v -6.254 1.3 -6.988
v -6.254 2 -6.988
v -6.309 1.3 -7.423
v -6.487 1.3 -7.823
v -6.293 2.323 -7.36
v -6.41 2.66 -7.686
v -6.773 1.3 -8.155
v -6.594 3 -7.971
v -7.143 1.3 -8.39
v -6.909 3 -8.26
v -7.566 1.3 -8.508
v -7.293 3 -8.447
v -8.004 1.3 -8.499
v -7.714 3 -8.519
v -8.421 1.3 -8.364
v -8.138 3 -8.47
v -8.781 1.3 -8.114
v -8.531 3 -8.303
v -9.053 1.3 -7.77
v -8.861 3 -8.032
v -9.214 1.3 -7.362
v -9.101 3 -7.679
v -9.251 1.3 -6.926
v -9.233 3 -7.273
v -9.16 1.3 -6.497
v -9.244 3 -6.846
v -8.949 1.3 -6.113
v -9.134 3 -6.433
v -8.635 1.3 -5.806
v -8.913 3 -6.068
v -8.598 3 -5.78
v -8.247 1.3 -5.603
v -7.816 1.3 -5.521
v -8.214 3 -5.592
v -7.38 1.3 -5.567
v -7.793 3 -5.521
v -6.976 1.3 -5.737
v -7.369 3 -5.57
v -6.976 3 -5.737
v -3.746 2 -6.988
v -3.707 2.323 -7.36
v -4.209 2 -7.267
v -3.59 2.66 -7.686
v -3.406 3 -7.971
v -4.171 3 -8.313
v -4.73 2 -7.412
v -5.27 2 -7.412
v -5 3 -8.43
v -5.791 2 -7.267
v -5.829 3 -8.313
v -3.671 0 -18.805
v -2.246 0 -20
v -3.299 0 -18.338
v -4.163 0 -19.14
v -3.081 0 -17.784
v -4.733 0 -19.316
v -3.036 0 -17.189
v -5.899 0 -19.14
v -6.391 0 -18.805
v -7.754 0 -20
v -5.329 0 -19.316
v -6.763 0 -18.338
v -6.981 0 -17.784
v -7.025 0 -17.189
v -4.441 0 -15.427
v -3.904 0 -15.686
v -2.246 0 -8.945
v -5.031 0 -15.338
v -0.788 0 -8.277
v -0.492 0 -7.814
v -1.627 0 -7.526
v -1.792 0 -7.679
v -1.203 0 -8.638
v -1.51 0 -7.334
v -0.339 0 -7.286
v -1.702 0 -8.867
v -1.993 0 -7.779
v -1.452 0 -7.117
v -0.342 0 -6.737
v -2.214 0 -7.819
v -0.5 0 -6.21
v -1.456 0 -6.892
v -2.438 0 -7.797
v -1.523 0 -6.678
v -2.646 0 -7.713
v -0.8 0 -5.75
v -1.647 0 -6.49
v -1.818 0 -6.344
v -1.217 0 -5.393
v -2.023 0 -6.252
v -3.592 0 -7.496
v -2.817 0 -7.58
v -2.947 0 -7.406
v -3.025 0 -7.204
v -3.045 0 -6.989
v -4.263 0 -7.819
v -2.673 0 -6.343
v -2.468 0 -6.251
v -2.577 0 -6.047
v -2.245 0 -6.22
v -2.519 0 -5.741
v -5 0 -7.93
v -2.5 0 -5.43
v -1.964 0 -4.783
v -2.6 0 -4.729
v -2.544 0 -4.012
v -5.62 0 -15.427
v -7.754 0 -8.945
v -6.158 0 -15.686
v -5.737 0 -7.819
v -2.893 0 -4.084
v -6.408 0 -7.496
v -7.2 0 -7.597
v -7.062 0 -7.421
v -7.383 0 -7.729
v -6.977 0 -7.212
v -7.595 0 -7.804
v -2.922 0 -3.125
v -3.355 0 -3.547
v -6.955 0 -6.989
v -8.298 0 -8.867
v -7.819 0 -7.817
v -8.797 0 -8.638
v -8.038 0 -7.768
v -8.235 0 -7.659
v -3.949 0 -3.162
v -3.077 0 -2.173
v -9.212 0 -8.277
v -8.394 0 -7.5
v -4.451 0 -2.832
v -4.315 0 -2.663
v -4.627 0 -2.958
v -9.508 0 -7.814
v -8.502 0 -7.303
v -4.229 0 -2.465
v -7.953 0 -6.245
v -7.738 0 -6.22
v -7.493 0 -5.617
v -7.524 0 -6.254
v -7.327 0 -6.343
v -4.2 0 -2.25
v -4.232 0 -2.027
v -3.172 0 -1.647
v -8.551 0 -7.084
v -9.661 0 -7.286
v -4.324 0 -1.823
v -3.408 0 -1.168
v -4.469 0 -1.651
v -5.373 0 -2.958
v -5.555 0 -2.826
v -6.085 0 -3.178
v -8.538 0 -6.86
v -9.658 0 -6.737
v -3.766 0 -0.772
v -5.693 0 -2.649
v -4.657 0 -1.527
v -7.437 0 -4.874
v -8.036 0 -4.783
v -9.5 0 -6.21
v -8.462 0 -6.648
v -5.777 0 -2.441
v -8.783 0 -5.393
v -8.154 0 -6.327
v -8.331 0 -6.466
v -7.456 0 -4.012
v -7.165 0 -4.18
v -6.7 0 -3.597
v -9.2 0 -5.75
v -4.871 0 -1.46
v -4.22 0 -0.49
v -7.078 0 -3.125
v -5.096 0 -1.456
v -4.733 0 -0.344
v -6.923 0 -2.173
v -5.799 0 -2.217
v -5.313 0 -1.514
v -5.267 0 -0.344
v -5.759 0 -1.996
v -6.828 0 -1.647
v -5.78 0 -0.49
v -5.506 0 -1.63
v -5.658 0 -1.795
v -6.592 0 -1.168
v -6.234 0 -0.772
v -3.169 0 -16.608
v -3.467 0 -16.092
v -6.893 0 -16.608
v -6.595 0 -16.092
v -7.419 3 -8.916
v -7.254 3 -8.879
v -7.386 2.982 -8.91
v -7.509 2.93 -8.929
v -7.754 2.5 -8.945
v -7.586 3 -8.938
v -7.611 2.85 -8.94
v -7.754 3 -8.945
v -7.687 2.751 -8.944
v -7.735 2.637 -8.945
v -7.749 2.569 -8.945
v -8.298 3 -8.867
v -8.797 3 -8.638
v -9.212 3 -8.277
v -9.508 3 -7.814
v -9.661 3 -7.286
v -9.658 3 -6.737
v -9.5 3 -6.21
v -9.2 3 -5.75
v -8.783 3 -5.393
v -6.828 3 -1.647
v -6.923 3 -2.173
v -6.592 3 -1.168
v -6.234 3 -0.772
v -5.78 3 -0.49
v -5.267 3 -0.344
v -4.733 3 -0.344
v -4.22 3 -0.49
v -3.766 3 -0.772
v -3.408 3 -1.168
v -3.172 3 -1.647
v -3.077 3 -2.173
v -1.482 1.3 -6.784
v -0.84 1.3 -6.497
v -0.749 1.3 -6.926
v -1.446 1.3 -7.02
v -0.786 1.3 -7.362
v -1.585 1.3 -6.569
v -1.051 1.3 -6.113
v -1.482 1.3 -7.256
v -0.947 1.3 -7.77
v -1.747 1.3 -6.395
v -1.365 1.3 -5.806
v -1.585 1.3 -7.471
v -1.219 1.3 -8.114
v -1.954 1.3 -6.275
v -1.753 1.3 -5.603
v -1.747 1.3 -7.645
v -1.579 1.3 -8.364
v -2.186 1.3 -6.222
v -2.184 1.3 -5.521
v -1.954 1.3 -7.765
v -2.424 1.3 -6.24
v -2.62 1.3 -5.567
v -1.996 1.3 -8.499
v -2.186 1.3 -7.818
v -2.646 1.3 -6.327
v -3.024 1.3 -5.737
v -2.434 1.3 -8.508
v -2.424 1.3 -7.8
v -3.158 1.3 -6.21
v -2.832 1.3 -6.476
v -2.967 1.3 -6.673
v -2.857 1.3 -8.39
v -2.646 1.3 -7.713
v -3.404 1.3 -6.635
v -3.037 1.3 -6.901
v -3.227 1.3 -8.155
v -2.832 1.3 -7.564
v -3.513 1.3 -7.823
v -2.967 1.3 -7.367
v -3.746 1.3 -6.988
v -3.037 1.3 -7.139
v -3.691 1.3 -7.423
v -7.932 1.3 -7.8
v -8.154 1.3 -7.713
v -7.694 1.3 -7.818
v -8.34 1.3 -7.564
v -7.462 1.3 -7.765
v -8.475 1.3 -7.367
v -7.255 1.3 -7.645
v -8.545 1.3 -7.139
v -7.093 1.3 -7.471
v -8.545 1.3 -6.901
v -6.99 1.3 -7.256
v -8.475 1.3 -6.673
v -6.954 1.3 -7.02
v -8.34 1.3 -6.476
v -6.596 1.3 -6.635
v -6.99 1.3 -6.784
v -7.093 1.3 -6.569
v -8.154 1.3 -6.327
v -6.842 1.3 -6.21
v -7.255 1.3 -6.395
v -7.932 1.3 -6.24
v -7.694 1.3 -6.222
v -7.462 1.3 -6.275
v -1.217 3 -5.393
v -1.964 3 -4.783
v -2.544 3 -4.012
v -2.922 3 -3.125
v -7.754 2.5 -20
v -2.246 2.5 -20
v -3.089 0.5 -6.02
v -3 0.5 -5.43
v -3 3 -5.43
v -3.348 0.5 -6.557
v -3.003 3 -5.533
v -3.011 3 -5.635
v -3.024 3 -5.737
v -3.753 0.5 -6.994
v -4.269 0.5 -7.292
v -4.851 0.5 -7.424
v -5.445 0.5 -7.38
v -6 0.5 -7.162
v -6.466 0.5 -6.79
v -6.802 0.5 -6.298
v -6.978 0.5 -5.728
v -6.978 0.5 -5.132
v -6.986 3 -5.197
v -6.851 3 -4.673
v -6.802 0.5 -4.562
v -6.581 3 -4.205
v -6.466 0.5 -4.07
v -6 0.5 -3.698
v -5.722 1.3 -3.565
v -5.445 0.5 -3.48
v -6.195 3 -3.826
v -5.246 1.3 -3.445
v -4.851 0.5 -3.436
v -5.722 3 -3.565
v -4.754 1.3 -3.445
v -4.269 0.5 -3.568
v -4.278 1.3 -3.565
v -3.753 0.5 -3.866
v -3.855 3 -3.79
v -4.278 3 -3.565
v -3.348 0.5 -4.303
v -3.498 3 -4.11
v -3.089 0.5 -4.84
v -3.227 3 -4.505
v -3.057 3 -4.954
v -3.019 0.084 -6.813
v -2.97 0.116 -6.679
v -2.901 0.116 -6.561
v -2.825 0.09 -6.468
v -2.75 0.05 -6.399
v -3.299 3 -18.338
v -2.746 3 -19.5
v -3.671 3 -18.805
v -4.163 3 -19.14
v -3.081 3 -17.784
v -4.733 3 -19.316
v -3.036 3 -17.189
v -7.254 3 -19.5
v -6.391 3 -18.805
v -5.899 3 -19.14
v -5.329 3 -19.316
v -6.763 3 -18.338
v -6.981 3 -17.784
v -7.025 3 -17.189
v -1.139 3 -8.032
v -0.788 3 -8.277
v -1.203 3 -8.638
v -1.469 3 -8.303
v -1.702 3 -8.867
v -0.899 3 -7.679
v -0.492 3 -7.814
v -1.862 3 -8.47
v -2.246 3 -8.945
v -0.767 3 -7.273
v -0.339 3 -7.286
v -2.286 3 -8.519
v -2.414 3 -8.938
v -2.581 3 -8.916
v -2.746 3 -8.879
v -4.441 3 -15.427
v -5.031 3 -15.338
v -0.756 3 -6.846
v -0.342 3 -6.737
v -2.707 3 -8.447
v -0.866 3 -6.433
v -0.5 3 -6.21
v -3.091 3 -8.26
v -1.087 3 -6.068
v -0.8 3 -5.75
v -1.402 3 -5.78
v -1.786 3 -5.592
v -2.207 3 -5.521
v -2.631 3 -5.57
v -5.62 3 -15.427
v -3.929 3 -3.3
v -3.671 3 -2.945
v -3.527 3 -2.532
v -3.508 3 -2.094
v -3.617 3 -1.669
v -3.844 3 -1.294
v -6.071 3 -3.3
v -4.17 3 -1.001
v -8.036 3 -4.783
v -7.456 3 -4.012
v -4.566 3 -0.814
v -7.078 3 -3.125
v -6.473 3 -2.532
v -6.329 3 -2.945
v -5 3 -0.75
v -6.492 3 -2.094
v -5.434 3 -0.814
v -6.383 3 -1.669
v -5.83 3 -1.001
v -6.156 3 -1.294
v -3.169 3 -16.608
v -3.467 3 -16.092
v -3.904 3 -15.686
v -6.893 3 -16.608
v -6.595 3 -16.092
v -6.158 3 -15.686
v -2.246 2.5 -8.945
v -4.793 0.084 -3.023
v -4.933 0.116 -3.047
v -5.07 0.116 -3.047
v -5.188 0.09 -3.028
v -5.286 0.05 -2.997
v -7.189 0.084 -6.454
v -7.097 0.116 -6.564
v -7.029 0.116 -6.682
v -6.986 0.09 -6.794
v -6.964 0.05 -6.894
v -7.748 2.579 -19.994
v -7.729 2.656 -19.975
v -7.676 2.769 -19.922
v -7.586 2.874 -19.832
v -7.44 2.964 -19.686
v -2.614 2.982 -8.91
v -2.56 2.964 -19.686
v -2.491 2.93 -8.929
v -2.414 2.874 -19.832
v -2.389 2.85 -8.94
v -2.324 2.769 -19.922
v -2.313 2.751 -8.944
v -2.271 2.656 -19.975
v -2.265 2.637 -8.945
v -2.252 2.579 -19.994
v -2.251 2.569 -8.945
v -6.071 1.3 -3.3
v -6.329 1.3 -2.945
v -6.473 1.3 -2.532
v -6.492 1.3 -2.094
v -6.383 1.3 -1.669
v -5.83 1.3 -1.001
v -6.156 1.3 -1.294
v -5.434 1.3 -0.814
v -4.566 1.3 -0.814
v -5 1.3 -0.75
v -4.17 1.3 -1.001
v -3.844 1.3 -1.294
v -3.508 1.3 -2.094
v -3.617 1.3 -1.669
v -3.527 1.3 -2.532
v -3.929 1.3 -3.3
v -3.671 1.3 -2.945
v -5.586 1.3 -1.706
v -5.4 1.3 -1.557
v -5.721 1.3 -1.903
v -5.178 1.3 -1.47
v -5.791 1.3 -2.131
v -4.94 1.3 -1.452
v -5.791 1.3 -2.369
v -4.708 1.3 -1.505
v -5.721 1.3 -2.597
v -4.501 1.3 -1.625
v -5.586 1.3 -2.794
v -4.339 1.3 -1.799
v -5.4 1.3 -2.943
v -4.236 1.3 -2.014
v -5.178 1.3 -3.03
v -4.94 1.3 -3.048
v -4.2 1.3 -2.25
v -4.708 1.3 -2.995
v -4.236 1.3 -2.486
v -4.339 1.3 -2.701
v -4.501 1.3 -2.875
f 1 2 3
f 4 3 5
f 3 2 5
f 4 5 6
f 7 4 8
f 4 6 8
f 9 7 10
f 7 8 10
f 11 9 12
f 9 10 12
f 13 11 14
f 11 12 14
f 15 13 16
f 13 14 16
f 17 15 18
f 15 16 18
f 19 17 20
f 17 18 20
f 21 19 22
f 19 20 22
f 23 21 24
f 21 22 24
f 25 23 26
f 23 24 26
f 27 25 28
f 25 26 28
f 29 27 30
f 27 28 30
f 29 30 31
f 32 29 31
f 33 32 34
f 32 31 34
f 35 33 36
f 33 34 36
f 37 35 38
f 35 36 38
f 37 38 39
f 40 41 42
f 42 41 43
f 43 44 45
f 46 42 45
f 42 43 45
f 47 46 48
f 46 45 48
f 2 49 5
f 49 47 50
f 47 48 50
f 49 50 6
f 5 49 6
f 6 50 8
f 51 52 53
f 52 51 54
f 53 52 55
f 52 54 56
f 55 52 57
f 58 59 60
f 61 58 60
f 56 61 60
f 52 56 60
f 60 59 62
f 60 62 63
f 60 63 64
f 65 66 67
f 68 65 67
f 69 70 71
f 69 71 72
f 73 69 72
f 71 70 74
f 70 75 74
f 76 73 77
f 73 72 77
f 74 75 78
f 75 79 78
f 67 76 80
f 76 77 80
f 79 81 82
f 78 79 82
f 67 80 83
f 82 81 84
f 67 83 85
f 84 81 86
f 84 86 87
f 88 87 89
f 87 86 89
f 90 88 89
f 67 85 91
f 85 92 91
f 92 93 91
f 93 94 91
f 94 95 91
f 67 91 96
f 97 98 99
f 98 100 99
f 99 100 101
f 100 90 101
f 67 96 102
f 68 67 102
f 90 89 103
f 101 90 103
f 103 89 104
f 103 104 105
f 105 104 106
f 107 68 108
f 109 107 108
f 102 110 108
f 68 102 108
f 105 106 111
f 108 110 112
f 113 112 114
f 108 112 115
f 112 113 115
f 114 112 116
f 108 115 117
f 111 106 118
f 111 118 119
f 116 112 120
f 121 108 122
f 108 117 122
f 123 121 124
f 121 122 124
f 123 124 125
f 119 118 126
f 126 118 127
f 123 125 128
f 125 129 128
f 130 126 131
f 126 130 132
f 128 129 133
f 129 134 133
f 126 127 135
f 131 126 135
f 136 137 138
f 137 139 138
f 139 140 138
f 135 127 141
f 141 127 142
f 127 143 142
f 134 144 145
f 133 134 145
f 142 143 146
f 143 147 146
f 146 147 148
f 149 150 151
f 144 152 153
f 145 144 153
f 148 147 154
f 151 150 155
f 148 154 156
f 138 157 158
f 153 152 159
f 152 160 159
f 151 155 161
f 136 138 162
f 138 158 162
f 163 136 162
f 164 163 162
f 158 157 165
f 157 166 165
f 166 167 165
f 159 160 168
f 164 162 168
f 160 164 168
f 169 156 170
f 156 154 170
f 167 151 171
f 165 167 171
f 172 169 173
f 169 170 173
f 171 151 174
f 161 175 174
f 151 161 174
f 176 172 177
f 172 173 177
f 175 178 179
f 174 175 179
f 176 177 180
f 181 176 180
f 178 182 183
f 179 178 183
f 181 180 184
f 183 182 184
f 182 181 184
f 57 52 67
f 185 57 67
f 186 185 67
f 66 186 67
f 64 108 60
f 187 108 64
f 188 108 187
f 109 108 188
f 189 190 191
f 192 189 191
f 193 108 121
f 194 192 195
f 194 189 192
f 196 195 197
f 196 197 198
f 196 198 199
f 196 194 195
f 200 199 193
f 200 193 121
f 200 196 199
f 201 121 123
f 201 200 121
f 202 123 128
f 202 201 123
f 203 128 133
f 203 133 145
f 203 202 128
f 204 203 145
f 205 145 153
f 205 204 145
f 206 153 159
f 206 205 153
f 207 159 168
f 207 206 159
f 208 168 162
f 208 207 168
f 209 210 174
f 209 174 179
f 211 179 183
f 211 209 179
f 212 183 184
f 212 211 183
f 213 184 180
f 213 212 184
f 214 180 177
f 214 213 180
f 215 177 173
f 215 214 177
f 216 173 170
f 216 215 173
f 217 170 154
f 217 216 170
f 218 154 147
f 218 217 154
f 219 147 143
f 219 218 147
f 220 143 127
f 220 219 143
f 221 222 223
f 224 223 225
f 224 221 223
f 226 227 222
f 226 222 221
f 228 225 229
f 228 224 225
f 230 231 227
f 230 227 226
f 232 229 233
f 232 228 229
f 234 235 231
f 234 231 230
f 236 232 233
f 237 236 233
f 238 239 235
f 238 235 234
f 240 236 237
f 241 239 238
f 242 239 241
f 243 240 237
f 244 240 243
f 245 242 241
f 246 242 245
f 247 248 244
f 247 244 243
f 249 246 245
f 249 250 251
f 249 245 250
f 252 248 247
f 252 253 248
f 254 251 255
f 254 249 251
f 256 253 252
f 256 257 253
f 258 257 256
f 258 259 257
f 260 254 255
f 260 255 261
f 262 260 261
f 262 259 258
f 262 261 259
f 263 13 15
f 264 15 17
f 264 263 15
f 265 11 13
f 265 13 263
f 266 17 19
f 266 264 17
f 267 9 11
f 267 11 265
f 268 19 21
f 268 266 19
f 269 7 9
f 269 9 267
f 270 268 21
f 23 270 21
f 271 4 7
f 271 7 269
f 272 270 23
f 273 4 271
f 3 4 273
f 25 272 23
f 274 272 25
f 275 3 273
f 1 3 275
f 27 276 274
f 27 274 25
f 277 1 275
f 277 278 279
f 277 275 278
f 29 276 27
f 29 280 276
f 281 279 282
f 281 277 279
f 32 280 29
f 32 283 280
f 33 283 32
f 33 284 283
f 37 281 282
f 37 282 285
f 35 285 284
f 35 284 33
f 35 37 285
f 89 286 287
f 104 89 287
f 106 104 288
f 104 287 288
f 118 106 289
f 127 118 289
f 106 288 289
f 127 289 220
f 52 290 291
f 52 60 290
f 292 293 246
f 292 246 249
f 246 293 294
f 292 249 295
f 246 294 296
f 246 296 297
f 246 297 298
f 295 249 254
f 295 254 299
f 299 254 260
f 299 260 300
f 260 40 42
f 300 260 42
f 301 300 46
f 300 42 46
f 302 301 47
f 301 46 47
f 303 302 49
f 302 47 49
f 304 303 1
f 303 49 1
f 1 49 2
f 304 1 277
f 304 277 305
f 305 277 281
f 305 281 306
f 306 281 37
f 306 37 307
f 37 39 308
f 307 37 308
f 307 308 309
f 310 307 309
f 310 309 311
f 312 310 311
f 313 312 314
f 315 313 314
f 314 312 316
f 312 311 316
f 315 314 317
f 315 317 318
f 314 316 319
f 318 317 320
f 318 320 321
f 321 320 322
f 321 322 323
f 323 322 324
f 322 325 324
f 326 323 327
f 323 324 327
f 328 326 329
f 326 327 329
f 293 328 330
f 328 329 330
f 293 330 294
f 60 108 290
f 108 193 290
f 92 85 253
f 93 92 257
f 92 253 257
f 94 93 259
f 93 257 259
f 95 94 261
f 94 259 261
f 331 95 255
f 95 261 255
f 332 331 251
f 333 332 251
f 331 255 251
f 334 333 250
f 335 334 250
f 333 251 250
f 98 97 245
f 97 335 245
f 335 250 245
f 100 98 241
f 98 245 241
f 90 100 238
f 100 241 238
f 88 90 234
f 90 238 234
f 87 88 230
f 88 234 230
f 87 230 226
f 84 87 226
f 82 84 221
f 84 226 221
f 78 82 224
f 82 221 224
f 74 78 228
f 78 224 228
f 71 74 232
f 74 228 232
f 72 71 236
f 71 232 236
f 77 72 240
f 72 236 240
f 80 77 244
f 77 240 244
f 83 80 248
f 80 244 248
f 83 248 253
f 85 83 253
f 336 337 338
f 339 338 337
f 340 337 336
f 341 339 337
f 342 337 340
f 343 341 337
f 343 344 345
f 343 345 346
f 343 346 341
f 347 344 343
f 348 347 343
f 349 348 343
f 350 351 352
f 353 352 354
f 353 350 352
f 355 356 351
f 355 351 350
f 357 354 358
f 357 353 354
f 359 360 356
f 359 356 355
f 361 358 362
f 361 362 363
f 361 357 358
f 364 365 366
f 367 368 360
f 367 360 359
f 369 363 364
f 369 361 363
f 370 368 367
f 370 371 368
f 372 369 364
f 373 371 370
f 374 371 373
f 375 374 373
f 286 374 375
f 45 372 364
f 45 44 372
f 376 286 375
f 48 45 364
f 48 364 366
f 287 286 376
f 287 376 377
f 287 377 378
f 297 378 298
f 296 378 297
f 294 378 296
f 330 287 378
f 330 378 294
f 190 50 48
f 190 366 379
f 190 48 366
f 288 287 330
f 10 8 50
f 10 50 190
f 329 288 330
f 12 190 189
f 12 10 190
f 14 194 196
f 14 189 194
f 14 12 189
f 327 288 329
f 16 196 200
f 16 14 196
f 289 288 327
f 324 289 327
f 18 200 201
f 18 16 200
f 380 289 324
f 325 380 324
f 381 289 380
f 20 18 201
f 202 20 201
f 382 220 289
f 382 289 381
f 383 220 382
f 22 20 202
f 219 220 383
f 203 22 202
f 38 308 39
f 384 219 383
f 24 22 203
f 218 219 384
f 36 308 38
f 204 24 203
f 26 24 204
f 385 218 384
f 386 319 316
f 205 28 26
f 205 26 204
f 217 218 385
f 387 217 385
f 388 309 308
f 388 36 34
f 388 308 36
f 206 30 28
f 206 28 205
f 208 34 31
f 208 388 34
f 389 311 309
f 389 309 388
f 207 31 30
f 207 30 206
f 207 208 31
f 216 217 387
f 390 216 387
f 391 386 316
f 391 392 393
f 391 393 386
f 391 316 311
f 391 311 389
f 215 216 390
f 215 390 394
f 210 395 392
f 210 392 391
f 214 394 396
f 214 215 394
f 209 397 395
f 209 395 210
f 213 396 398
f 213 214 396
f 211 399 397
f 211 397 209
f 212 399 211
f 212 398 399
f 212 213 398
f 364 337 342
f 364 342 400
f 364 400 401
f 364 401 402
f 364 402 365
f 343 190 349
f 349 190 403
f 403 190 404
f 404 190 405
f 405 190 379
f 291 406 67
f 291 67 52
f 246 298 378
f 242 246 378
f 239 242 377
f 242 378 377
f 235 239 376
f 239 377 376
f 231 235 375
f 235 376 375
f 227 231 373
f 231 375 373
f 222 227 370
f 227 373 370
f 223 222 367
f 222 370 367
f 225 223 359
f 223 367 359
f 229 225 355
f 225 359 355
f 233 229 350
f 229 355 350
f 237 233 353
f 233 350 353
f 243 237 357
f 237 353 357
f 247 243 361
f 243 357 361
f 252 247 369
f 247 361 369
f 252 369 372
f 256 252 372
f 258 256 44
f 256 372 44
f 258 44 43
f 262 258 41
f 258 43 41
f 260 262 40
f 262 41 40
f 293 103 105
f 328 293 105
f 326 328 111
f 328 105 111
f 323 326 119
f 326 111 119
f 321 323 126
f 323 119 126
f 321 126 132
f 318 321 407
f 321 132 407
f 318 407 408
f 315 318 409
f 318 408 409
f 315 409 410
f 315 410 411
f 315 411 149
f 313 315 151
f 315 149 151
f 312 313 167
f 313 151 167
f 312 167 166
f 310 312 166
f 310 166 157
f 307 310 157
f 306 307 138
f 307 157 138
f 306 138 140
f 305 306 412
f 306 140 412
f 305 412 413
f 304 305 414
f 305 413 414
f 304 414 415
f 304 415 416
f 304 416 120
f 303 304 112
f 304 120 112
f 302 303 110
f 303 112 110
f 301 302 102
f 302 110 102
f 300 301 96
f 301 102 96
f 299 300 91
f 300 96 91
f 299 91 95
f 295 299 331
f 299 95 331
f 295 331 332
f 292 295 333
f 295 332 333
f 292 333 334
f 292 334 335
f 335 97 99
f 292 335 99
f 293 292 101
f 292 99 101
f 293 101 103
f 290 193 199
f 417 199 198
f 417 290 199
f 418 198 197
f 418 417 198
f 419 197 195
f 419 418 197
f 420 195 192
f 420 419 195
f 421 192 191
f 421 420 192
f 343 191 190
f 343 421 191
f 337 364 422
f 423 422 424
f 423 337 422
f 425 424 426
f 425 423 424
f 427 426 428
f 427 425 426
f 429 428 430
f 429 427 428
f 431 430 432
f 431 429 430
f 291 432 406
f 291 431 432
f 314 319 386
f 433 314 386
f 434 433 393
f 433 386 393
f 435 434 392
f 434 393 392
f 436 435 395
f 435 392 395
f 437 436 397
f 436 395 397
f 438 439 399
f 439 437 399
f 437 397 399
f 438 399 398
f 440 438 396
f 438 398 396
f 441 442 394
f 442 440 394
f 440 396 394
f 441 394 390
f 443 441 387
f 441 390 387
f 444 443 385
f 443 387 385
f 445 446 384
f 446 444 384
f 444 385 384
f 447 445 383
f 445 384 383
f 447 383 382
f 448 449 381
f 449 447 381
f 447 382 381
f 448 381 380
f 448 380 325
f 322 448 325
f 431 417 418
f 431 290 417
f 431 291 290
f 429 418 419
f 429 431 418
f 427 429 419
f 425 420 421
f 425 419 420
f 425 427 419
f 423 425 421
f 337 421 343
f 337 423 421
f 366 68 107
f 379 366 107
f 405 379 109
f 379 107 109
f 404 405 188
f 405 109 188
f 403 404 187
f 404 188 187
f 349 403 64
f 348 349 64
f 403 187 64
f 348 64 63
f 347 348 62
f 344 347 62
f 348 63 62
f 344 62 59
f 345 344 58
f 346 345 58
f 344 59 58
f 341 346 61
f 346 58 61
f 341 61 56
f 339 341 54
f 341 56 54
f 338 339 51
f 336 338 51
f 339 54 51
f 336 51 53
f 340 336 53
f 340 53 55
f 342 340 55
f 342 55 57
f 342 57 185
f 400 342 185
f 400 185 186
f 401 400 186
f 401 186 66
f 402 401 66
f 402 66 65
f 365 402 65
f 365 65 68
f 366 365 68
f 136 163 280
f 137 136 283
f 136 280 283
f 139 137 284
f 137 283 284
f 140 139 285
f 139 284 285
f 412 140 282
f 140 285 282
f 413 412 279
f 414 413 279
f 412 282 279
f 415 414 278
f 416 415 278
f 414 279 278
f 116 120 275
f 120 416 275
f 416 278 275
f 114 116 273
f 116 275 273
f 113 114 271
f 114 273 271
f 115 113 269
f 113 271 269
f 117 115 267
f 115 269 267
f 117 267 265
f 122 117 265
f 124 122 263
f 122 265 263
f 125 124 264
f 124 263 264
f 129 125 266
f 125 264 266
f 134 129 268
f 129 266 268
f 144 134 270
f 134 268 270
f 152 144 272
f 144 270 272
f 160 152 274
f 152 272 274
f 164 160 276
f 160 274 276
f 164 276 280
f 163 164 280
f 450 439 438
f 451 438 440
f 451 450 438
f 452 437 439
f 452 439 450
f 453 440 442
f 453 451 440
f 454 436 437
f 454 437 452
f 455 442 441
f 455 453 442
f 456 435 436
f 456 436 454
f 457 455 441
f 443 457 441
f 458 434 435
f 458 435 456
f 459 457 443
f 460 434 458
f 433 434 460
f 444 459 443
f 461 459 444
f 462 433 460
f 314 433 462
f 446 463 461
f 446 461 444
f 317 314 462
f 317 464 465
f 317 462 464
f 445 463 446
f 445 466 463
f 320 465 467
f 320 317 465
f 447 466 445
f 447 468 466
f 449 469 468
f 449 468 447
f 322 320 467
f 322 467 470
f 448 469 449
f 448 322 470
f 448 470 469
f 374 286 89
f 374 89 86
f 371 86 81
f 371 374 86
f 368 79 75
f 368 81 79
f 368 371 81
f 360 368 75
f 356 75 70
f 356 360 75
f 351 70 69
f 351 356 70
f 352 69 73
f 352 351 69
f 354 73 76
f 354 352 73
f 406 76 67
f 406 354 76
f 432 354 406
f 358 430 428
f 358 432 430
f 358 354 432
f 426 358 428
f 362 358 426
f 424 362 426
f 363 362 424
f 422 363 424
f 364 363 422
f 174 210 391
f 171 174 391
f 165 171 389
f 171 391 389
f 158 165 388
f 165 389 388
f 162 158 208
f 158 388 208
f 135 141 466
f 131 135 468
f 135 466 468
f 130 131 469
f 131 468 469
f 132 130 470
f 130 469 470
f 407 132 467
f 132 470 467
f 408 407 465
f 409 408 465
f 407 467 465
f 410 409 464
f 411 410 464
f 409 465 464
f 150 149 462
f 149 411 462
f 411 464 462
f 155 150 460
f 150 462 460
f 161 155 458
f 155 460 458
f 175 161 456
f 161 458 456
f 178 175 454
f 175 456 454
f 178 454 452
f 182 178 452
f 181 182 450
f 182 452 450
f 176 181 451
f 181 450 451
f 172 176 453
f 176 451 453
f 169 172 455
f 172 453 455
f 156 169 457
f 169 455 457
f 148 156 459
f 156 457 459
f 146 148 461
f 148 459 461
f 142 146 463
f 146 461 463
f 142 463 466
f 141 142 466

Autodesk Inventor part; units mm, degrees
ref_plane "XZ Plane" through (0, 0, 0) normal (0, 1, 0) x (-1, 0, 0)
ref_plane "XY Plane" through (0, 0, 0) normal (0, 0, 1) x (1, 0, 0)
sketch "Sketch2" plane through (0, 0, 0) normal (0, 1, 0) x (-1, 0, 0)
  line L0 (0, 0) -> (10, 0)
  line L1 (10, 0) -> (10, -20)
  line L2 (10, -20) -> (0, -20)
  line L3 (0, -20) -> (0, 0)
  dimension "d0" = 20
  dimension "d1" = 10
extrude "Extrusion1" add sketch "Sketch2" along normal blind 3
sketch "Sketch3" plane through (0, 3, 0) normal (0, 1, 0) x (1, 0, 0)
  line L0 (-10, 20) -> (-10, 0) projected
  line L1 (0, 20) -> (-10, 20) projected
  line L2 (-10, 0) -> (0, 0) projected
  circle A0 centre (-5, 2.25) radius 0.8
  circle A1 centre (-5, 2.25) radius 1.5
  circle A2 centre (-5, 5.43) radius 2
  point P0 (-4.2781, 3.5648)
  point P1 (-5.7219, 3.5648)
  dimension "d4" = 5
  dimension "d7" = 0
  dimension "d8" = 3.18
  dimension "d10" = 1.6
  dimension "d11" = 2.25
  dimension "d12" = 3
  dimension "d13" = 4
extrude "Extrusion2" cut sketch "Sketch3" against normal through all contours A0
pattern_circular "Circular Pattern1" count 3 over 360 about axis through (-5, 3, -5.43) along (0, 1, 0) of "Extrusion2"
ref_plane "Work Plane2" through (0, 1.3, 0) normal (0, -1, 0) x (1, 0, 0)
ref_plane "Work Plane1" through (0, 0, 0) normal (0, -1, 0) x (1, 0, 0)
extrude "Extrusion3" cut sketch "Sketch3" against normal up to surface (1.7 mm away) contours A0 | A1 A2 | A2 A1 picked at (-5.474, 3.3061) picked at (-4.9499, 3.5442)
extrude "Extrusion4" cut sketch "Sketch3" against normal through all contours A2 A1 | A1 A2 picked at (-4.9499, 3.5442) picked at (-4.9466, 6.1911)
pattern_circular "Circular Pattern2" count 3 over 360 about axis through (-5, 3, -5.43) along (0, 1, 0) of "Extrusion4", "Extrusion3"
sketch "Sketch6" plane through (0, 3, 0) normal (0, 1, 0) x (1, 0, 0)
  arc A0 (-6.2543, 6.9878) -> (-6.9762, 5.7374) centre (-7.754, 7.02) ccw projected
  circle A1 centre (-7.754, 7.02) radius 1.925
  arc A2 (-3.7457, 6.9878) -> (-6.2543, 6.9878) centre (-5, 5.43) ccw projected
  circle A3 centre (-5, 2.25) radius 1.925
  circle A4 centre (-2.246, 7.02) radius 1.925
  arc A5 (-6.9234, 2.1727) -> (-8.7827, 5.3929) centre (-10.9202, 2.012) ccw
  arc A6 (-1.2173, 5.3929) -> (-3.0766, 2.1727) centre (0.9202, 2.012) ccw
  arc A7 (-6.8592, 8.7244) -> (-3.1408, 8.7244) centre (-5, 12.2661) ccw
  line L0 (-7.754, 8.945) -> (-7.754, 22.7123)
  line L1 (-7.754, 22.7123) -> (-16.28, 22.7123)
  line L2 (-16.28, 22.7123) -> (-16.28, -9.8438)
  line L3 (-16.28, -9.8438) -> (12.2065, -9.8438)
  line L4 (12.2065, -9.8438) -> (12.2065, 22.7123)
  line L5 (12.2065, 22.7123) -> (-2.5928, 22.7123)
  line L6 (-2.246, 8.945) -> (-2.246, 22.7123)
  point P0 (0, 0)
  point P1 (-1.2173, 5.3929)
  point P2 (-3.0766, 2.1727)
  dimension "d35" = 0.425
  dimension "d38" = 360
  dimension "d40" = 4
  dimension "d43" = 360
extrude "Extrusion5" cut sketch "Sketch6" against normal through all contours A1 A5 A3 A6 A4 L6 L5 L4 L3 L2 L1 L0
sketch "Sketch7" plane through (0, 3, 0) normal (0, 1, 0) x (1, 0, 0)
  point P0 (0, 0)
  point P1 (-5.0309, 17.3385)
hole "Hole1" at (-5.0309, 3, -17.3385) direction (0, -1, 0) diameter 4 end through all
chamfer "Chamfer1" distance 1 angle 45 1 edges at (-5, 3, -7.43)
chamfer "Chamfer2" distance 0.5 angle 45 1 edges at (-4.2781, 0, -7.2952)
ref_plane "Work Plane3" through (-5, 0, -1.45) normal (1, 0, 0) x (0, 1, 0)
fillet "Fillet4" radius 0.5 3 edges at (-5, 3, -20) (-2.246, 3, -14.4725) (-7.754, 3, -14.4725)
equation "\"d4\" = 0.5 * d1"
properties part number "motorholder-nocurvature"
